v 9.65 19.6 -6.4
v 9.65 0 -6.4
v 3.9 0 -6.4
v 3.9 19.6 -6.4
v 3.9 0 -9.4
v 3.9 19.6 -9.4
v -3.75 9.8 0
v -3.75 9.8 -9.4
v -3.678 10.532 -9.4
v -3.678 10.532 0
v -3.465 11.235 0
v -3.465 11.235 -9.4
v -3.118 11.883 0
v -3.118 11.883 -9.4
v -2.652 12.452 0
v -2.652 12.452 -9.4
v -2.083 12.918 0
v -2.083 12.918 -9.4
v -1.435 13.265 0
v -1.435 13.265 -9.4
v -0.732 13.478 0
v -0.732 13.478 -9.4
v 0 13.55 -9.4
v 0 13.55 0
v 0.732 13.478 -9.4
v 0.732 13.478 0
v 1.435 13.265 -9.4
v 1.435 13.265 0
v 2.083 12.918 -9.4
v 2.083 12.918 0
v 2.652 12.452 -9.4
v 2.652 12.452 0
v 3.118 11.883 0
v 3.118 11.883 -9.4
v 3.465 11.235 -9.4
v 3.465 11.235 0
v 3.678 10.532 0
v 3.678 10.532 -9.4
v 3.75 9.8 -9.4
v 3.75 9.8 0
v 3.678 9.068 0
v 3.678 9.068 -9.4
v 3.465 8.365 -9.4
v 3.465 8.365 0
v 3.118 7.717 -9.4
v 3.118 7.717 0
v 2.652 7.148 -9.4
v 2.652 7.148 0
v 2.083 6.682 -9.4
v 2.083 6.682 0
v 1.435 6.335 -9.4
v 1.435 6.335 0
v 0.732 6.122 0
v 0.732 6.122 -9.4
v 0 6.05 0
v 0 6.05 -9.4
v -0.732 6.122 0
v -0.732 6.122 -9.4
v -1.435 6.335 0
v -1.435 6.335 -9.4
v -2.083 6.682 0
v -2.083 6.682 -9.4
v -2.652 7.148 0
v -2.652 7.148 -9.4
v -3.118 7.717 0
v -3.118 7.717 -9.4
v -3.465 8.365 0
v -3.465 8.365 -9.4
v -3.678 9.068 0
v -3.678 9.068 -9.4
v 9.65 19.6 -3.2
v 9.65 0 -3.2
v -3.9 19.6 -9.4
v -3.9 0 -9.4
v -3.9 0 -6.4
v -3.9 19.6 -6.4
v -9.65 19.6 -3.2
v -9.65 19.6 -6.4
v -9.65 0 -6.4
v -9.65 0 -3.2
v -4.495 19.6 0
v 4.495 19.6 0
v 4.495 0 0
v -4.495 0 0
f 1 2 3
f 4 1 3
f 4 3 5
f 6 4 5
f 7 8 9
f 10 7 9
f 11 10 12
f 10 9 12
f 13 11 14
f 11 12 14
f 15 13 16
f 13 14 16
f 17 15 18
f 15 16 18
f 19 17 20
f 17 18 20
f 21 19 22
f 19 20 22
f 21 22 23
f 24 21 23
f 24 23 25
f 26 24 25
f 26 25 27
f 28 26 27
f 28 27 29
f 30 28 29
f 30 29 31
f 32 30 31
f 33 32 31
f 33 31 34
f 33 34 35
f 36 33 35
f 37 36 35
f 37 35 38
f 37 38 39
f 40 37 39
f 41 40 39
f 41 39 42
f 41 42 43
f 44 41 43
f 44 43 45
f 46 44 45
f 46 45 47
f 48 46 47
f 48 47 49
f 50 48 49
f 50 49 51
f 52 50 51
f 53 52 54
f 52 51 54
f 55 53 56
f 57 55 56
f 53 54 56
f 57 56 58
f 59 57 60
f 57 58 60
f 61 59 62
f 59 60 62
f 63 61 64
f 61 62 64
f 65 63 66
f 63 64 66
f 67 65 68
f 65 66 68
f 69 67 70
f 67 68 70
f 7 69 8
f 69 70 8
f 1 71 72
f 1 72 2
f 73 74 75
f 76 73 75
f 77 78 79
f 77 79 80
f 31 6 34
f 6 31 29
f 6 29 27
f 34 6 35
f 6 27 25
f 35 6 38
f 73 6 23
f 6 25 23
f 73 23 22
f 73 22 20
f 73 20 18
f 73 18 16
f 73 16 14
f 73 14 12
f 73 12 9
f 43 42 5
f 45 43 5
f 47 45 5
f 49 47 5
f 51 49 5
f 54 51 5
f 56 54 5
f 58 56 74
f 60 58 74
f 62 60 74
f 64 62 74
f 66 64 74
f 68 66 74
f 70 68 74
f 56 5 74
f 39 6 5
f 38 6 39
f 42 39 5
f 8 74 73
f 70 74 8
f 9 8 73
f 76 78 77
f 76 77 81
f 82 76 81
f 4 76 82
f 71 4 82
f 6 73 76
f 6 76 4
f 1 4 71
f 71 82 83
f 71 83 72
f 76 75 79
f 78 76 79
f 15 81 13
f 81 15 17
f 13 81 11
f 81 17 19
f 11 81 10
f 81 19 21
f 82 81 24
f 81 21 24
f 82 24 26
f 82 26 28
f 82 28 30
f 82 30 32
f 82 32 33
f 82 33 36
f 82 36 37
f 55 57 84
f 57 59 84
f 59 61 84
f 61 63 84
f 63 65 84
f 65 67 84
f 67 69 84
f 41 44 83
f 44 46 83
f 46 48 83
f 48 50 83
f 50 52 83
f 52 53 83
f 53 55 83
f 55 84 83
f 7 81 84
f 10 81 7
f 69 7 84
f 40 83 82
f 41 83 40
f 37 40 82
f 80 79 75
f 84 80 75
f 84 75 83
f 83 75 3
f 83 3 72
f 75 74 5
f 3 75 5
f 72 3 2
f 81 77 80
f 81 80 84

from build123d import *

# Parameters (mm, degrees)
EXTRUDE_1_DEPTH     = 19.6
SKETCH_2_R          = 3.75
CUT_EXTRUDE_1_DEPTH = 24.783239897


with BuildPart() as part:
    # 草图1 → 凸台-拉伸1 (new body)
    with BuildSketch(Plane(origin=(0, 0, 0), x_dir=(1, 0, 0), z_dir=(0, 1, 0))):
        Polygon((-4.495, 0), (4.495, 0), (9.65, 3.2), (9.65, 6.4), (3.9, 6.4), (3.9, 9.4), (-3.9, 9.4), (-3.9, 6.4), (-9.65, 6.4), (-9.65, 3.2), align=None)
    extrude(amount=EXTRUDE_1_DEPTH)

    # 草图2 → 切除-拉伸1 (cut, through all)
    with BuildSketch(Plane(origin=(0, 0, -9.4), x_dir=(-1, 0, 0), z_dir=(0, 0, -1))):
        with Locations((0, 9.8)):
            Circle(SKETCH_2_R)
    extrude(amount=-CUT_EXTRUDE_1_DEPTH, mode=Mode.SUBTRACT)


solid = part.part
